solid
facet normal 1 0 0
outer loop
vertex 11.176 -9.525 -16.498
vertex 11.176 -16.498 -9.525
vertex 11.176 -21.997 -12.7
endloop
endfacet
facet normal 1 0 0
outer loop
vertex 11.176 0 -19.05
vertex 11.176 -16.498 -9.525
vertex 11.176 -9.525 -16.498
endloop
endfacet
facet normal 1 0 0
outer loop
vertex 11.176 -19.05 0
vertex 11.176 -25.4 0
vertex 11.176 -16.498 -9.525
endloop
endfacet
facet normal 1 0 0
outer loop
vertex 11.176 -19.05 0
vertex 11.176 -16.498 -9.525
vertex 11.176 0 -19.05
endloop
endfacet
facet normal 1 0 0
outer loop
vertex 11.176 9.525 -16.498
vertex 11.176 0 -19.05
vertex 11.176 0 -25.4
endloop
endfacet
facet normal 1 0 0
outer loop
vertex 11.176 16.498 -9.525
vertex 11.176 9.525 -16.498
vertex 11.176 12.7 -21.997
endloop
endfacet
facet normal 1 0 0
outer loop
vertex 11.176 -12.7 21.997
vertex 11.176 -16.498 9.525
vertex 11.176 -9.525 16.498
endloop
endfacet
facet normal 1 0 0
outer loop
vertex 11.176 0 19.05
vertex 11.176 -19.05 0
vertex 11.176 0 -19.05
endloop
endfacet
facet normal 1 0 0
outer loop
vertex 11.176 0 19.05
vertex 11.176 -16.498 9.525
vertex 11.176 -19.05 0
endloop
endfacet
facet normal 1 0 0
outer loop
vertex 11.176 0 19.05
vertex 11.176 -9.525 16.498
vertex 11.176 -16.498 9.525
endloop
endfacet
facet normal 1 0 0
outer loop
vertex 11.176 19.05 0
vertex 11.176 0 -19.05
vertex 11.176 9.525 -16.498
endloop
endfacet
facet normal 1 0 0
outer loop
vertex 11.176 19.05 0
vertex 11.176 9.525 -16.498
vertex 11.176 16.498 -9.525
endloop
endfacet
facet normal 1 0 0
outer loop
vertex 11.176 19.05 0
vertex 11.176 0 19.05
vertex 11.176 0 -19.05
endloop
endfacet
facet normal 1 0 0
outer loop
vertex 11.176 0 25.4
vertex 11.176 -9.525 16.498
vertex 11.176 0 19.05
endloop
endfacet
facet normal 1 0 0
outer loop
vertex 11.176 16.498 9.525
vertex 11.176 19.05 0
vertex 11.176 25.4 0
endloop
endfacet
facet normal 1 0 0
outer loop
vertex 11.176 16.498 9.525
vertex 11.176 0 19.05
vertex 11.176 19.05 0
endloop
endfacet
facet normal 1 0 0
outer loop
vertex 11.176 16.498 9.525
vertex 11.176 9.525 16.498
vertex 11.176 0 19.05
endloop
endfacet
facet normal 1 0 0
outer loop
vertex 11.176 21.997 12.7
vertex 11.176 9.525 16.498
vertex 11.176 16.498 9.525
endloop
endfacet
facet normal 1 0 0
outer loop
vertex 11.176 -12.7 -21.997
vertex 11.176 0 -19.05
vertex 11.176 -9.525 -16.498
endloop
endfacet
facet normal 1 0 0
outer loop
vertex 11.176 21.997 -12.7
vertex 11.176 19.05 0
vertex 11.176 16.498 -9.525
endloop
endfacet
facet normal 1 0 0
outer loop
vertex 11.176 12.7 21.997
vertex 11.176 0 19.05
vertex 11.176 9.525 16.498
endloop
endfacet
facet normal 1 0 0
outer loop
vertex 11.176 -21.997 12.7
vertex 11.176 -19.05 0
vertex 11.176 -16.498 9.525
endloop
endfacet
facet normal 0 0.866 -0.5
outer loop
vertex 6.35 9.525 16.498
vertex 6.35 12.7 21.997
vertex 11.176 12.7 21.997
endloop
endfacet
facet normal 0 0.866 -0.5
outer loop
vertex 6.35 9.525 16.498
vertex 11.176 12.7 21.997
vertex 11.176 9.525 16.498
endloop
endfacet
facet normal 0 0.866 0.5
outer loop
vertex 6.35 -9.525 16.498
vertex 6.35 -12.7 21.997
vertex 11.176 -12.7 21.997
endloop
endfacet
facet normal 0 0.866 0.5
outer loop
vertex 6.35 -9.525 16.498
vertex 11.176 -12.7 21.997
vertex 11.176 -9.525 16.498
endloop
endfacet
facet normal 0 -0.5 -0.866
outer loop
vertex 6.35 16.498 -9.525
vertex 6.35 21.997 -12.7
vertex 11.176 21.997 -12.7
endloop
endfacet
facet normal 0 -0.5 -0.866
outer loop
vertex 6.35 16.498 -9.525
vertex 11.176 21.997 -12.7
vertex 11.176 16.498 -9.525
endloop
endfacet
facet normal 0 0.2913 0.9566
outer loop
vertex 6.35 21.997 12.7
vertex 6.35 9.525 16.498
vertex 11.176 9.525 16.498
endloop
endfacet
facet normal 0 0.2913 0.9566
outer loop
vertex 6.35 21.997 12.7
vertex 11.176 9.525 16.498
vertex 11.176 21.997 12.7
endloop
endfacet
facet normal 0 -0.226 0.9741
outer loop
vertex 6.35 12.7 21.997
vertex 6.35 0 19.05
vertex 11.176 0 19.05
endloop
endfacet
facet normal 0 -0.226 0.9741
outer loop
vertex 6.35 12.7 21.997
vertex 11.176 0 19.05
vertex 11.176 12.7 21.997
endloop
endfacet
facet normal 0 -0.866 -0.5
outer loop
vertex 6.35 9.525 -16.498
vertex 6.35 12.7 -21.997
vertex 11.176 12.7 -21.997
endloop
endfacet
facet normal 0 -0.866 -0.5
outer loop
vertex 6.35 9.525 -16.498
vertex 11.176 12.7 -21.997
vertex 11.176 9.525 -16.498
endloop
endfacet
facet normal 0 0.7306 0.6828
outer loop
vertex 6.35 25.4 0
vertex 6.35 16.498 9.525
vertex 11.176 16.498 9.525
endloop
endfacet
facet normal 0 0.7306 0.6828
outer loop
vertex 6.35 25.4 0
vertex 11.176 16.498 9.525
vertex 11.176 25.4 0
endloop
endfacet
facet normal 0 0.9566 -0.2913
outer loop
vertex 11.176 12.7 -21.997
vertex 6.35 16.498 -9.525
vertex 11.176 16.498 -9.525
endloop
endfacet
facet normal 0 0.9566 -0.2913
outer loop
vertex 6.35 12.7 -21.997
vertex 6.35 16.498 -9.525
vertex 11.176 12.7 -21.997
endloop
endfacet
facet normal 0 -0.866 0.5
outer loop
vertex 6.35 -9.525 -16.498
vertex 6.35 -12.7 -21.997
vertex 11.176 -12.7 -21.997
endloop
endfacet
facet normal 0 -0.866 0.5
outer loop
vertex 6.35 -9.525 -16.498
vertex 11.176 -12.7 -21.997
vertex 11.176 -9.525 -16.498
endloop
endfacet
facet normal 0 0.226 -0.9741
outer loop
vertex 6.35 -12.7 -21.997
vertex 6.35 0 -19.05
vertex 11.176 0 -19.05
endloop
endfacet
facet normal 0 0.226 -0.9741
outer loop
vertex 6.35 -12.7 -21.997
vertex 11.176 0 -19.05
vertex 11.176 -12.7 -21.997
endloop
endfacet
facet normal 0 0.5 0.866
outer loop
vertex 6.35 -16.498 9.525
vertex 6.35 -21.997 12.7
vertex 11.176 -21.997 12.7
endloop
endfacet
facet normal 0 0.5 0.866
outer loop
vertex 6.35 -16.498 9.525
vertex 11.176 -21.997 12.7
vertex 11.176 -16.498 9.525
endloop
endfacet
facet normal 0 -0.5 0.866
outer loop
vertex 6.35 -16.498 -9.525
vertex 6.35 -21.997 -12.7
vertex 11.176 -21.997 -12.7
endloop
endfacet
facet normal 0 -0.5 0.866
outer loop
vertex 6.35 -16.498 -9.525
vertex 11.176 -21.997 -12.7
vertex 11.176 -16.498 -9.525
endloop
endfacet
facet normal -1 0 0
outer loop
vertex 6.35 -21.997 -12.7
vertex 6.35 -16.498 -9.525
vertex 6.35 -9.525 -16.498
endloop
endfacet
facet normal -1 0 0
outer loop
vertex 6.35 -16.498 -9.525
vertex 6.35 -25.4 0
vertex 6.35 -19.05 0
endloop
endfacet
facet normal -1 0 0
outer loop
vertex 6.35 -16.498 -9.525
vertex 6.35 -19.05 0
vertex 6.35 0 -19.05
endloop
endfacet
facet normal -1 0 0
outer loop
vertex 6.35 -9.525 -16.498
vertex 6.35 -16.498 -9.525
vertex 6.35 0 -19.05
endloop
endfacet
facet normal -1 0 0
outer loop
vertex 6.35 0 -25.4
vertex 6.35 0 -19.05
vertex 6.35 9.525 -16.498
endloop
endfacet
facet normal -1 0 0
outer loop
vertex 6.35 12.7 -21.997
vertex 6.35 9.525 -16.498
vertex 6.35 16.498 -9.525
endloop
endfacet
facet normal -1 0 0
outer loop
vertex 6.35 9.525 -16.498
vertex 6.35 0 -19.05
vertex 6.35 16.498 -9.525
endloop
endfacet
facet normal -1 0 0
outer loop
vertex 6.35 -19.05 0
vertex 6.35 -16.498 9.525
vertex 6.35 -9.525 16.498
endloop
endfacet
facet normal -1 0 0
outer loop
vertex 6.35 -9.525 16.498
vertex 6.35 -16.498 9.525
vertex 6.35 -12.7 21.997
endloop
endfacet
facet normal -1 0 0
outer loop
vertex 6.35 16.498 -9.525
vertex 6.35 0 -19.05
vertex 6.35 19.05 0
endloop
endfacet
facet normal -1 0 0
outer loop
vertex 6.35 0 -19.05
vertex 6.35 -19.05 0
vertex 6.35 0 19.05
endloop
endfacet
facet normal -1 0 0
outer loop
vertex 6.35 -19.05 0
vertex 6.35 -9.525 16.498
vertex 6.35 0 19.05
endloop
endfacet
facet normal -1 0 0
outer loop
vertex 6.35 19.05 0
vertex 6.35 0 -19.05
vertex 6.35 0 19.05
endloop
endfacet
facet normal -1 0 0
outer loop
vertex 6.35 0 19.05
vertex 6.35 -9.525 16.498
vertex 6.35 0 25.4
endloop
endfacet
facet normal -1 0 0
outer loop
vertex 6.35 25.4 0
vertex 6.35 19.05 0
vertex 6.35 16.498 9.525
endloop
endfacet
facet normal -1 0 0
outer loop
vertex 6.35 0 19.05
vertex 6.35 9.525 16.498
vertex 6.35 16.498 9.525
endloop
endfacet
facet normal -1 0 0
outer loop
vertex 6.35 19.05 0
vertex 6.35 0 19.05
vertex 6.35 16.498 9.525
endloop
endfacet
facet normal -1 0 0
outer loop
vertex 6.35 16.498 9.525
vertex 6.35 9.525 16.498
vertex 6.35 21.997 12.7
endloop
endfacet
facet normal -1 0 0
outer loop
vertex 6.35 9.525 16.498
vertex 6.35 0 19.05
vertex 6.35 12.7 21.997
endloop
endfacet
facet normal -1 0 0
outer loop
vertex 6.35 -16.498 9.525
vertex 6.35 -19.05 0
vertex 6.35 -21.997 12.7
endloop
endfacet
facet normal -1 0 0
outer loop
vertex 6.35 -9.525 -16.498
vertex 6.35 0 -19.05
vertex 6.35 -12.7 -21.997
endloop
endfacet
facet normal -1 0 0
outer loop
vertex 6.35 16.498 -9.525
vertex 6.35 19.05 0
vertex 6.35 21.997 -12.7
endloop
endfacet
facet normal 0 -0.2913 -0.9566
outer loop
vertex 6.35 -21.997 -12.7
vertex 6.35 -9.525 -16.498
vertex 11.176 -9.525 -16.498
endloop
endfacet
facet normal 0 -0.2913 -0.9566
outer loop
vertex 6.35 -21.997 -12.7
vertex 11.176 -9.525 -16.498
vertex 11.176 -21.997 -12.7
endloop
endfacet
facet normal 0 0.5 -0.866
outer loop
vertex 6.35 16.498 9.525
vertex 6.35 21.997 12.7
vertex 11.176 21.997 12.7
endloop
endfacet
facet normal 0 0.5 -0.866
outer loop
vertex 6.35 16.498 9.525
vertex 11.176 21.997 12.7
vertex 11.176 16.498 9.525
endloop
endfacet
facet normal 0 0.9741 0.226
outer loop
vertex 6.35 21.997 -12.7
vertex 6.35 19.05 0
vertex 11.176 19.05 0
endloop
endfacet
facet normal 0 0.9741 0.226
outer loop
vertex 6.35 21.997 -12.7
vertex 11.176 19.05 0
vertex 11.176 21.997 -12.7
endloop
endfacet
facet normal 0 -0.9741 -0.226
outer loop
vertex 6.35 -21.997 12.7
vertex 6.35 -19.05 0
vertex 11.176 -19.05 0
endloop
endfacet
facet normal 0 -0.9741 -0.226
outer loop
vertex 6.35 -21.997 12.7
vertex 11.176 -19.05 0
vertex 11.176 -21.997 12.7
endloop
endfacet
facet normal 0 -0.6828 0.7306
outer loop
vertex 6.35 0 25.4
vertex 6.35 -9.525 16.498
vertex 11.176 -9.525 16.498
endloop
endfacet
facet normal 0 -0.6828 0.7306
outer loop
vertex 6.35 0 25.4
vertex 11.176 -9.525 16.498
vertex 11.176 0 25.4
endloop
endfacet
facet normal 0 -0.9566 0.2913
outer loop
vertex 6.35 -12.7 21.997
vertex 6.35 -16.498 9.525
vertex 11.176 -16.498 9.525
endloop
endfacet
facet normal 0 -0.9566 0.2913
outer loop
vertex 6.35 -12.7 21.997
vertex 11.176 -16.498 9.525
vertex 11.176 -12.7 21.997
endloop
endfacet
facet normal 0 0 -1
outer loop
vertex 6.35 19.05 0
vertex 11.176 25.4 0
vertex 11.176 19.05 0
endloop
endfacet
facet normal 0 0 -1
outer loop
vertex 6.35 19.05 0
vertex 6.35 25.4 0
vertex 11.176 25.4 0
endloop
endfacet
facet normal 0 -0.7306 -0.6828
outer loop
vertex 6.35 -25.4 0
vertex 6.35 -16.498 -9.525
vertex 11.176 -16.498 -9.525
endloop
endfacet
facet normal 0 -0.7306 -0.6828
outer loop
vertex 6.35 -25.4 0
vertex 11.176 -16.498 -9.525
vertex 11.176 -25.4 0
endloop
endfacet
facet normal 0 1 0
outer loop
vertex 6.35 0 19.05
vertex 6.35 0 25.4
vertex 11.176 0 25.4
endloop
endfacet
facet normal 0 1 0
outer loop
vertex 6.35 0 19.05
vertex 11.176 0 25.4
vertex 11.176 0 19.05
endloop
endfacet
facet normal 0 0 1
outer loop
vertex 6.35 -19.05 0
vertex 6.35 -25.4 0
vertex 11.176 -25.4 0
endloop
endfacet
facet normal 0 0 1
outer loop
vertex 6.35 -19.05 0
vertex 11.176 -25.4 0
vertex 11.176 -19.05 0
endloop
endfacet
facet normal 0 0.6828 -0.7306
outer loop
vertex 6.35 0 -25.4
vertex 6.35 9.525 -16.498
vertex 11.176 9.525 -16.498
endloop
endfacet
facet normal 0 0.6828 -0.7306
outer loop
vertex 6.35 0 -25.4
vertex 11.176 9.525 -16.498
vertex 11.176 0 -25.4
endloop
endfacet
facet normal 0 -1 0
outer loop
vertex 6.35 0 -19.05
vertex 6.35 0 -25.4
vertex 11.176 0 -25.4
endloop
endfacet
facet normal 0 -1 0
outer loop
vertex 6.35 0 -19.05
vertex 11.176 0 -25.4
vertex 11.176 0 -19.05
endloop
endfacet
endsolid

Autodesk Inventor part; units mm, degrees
ref_plane "XZ Plane" through (0, 0, 0) normal (0, 1, 0) x (-1, 0, 0)
ref_plane "XY Plane" through (0, 0, 0) normal (0, 0, 1) x (1, 0, 0)
sketch "Sketch1" plane through (0, 0, 0) normal (1, 0, 0) x (0, 1, 0)
  line L0 (16.4978, 9.525) -> (25.4, 0)
  line L1 (25.4, 0) -> (19.05, 0)
  line L2 (9.525, 16.4978) -> (21.997, 12.7)
  line L3 (21.997, 12.7) -> (16.4978, 9.525)
  line L4 (0, 19.05) -> (12.7, 21.997)
  line L5 (12.7, 21.997) -> (9.525, 16.4978)
  line L6 (-9.525, 16.4978) -> (0, 25.4)
  line L7 (0, 25.4) -> (0, 19.05)
  line L8 (-16.4978, 9.525) -> (-12.7, 21.997)
  line L9 (-12.7, 21.997) -> (-9.525, 16.4978)
  line L10 (-19.05, 0) -> (-21.997, 12.7)
  line L11 (-21.997, 12.7) -> (-16.4978, 9.525)
  line L12 (-16.4978, -9.525) -> (-25.4, 0)
  line L13 (-25.4, 0) -> (-19.05, 0)
  line L14 (-9.525, -16.4978) -> (-21.997, -12.7)
  line L15 (-21.997, -12.7) -> (-16.4978, -9.525)
  line L16 (0, -19.05) -> (-12.7, -21.997)
  line L17 (-12.7, -21.997) -> (-9.525, -16.4978)
  line L18 (9.525, -16.4978) -> (0, -25.4)
  line L19 (0, -25.4) -> (0, -19.05)
  line L20 (16.4978, -9.525) -> (12.7, -21.997)
  line L21 (12.7, -21.997) -> (9.525, -16.4978)
  line L22 (19.05, 0) -> (21.997, -12.7)
  line L23 (21.997, -12.7) -> (16.4978, -9.525)
  point P0 (0, 0)
  dimension "d7" = 360
ref_plane "Work Plane1" through (6.35, 0, 0) normal (1, 0, 0) x (0, 1, 0)
sketch "Sketch2" plane through (6.35, 0, 0) normal (1, 0, 0) x (0, 1, 0)
  line L0 (21.997, 12.7) -> (16.4978, 9.525)
  line L1 (16.4978, 9.525) -> (25.4, 0)
  line L2 (25.4, 0) -> (19.05, 0)
  line L3 (19.05, 0) -> (21.997, -12.7)
  line L4 (21.997, -12.7) -> (16.4978, -9.525)
  line L5 (16.4978, -9.525) -> (12.7, -21.997)
  line L6 (12.7, -21.997) -> (9.525, -16.4978)
  line L7 (9.525, -16.4978) -> (0, -25.4)
  line L8 (0, -25.4) -> (0, -19.05)
  line L9 (0, -19.05) -> (-12.7, -21.997)
  line L10 (-12.7, -21.997) -> (-9.525, -16.4978)
  line L11 (-9.525, -16.4978) -> (-21.997, -12.7)
  line L12 (-21.997, -12.7) -> (-16.4978, -9.525)
  line L13 (-16.4978, -9.525) -> (-25.4, 0)
  line L14 (-25.4, 0) -> (-19.05, 0)
  line L15 (-19.05, 0) -> (-21.997, 12.7)
  line L16 (-21.997, 12.7) -> (-16.4978, 9.525)
  line L17 (-16.4978, 9.525) -> (-12.7, 21.997)
  line L18 (-12.7, 21.997) -> (-9.525, 16.4978)
  line L19 (-9.525, 16.4978) -> (0, 25.4)
  line L20 (0, 25.4) -> (0, 19.05)
  line L21 (0, 19.05) -> (12.7, 21.997)
  line L22 (12.7, 21.997) -> (9.525, 16.4978)
  line L23 (9.525, 16.4978) -> (21.997, 12.7)
  point P0 (0, 0)
extrude "Extrusion1" add sketch "Sketch2" along normal blind 4.826
properties part number "ratchet_gear"
